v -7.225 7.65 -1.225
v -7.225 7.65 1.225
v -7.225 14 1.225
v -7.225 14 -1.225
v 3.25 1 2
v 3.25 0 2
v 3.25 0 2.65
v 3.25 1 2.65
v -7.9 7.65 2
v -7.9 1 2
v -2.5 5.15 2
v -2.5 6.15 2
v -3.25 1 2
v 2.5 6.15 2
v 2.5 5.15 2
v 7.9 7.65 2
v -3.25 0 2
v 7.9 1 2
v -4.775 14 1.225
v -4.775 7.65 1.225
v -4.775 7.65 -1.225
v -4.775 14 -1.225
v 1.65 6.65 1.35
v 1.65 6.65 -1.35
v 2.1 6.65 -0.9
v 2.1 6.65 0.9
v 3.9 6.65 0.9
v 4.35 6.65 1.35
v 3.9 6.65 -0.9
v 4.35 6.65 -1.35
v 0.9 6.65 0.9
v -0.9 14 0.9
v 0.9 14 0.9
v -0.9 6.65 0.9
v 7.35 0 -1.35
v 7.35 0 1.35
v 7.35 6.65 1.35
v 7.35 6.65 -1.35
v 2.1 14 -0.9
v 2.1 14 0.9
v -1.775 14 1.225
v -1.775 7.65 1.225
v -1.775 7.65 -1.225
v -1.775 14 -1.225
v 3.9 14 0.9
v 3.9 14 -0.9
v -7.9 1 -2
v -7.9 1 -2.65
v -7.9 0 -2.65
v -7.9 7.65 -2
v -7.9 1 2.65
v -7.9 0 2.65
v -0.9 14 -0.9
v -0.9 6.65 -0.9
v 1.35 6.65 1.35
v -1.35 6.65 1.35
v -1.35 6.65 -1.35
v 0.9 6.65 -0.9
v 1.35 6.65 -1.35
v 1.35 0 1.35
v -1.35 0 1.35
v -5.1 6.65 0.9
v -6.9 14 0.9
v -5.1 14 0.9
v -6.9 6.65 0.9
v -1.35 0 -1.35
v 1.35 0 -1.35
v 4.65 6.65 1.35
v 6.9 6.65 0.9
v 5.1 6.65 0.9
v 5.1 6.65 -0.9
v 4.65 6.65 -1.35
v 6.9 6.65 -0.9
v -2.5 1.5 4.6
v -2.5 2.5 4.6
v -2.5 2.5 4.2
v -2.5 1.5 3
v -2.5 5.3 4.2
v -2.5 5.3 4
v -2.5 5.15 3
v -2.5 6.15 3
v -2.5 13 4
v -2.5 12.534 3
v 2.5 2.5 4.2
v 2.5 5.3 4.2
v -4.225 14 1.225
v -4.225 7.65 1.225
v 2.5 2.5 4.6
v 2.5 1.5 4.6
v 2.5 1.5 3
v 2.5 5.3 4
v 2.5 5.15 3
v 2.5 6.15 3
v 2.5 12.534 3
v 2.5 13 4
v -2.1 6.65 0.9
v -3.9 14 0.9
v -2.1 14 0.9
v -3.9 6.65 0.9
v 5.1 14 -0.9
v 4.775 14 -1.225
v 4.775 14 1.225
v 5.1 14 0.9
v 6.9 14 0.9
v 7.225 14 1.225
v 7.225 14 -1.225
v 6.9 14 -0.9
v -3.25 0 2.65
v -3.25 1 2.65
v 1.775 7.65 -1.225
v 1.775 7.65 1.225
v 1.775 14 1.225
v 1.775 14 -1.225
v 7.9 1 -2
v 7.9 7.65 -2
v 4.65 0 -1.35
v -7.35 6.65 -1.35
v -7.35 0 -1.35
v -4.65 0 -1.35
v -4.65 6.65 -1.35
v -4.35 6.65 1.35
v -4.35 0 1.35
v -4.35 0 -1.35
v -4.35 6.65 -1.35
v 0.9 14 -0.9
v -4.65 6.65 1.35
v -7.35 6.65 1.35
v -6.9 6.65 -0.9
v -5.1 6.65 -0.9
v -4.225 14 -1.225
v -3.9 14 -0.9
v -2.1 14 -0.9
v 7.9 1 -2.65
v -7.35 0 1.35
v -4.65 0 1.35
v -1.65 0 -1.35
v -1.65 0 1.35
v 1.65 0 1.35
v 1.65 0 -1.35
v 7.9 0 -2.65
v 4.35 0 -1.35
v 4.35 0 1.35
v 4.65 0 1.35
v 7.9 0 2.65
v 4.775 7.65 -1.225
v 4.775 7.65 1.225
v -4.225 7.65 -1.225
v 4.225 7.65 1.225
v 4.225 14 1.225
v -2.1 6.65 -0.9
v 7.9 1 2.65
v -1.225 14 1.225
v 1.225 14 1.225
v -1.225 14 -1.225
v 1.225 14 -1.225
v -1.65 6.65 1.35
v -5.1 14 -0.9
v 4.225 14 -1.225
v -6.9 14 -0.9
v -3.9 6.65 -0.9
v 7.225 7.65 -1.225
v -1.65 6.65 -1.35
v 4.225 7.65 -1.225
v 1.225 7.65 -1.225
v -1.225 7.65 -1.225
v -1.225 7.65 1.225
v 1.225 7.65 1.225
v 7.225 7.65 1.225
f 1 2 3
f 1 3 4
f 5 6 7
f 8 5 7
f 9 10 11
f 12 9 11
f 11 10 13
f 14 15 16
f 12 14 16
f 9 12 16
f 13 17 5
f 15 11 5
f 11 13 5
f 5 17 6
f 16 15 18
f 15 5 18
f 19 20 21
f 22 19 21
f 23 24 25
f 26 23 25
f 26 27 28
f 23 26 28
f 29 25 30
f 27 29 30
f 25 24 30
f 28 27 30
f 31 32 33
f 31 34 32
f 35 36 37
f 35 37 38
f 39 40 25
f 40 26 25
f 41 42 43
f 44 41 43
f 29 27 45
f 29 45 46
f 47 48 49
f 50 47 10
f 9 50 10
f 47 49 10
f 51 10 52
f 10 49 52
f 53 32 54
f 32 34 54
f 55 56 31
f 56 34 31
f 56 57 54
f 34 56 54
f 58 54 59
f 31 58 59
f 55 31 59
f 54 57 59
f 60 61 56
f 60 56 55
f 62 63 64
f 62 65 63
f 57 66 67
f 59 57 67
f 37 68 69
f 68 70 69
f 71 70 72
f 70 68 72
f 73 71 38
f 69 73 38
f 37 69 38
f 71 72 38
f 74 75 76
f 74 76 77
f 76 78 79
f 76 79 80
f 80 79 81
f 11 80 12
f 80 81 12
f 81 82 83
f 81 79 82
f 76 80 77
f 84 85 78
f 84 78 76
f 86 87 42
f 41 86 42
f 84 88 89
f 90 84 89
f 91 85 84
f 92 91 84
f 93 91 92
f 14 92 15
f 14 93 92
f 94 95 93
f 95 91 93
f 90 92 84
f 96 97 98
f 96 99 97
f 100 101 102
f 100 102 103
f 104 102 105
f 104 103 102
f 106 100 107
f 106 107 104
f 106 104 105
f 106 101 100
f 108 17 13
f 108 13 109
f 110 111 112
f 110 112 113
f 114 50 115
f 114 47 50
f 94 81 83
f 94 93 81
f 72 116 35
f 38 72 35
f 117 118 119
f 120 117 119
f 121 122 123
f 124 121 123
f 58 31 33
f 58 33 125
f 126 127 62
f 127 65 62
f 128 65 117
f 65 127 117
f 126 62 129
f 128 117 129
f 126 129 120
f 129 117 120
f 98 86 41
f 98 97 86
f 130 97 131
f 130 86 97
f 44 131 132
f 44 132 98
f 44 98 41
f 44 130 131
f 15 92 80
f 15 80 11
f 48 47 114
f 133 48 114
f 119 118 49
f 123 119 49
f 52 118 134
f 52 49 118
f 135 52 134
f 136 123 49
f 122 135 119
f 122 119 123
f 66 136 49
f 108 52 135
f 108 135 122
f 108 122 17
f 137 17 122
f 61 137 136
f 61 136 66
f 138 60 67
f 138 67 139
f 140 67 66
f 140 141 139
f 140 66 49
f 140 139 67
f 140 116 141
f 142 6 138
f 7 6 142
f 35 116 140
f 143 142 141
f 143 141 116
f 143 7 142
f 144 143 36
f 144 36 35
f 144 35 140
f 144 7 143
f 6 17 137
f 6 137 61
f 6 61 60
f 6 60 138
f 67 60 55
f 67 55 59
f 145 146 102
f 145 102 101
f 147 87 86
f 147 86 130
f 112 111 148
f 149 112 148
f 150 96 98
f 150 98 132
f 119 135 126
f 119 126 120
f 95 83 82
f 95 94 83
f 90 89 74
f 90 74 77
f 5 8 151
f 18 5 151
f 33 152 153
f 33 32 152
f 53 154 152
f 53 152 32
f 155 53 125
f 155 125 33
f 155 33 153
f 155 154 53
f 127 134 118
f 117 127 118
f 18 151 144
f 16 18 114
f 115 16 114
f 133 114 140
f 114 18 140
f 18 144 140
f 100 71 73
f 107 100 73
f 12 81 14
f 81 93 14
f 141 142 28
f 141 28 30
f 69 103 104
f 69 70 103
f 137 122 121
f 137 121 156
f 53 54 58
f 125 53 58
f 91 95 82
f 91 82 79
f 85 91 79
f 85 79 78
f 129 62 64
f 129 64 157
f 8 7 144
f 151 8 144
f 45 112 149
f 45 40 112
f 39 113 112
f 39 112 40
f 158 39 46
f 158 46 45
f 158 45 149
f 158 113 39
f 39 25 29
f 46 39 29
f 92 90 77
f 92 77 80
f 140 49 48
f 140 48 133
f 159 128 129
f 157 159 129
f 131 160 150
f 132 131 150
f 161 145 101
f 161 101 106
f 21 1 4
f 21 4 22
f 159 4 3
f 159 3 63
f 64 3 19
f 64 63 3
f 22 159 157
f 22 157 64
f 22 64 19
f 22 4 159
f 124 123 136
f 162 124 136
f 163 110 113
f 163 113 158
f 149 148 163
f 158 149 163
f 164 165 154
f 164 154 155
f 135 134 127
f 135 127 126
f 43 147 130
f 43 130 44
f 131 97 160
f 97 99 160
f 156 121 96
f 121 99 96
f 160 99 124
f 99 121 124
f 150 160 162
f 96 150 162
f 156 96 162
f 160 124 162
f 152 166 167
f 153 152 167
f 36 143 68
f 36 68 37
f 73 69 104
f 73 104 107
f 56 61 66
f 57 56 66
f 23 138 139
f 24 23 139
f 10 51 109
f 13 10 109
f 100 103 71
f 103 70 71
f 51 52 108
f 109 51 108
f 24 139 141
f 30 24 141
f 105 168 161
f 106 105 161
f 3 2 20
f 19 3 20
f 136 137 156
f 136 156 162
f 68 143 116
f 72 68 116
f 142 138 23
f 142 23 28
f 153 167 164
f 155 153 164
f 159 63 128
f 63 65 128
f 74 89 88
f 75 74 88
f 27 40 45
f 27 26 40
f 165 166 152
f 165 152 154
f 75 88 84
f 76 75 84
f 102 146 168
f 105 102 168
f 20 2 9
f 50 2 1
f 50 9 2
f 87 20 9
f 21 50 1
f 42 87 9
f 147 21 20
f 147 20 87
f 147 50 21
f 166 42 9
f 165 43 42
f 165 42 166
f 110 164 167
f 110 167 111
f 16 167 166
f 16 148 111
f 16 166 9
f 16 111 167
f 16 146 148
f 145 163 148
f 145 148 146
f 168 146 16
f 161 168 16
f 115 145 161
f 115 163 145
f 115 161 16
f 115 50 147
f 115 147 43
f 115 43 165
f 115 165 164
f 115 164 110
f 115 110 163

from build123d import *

# Parameters (mm, degrees)
SKETCH1_W           = 15.8
SKETCH1_H           = 4
SKETCH1_W_2         = 2.7
SKETCH1_H_2         = 2.7
BOSS_EXTRUDE1_DEPTH = 7.65
SKETCH2_W           = 15.8
SKETCH2_H           = 4
SKETCH2_W_2         = 1.8
SKETCH2_H_2         = 1.8
BOSS_EXTRUDE2_DEPTH = 1
SKETCH3_W           = 2.45
SKETCH3_H           = 2.45
SKETCH3_W_2         = 1.8
SKETCH3_H_2         = 1.8
BOSS_EXTRUDE3_DEPTH = 6.35
SKETCH4_W           = 4.65
SKETCH4_H           = 0.65
SKETCH4_W_2         = 15.8
BOSS_EXTRUDE4_DEPTH = 1
SKETCH5_W           = 1
SKETCH5_H           = 1
SKETCH5_W_2         = 0.4
BOSS_EXTRUDE5_DEPTH = 2.5


with BuildPart() as part:
    # Sketch1 → Boss-Extrude1 (new body)
    with BuildSketch(Plane(origin=(0, 0, 0), x_dir=(1, 0, 0), z_dir=(0, 1, 0))):
        Rectangle(SKETCH1_W, SKETCH1_H)
        Rectangle(SKETCH1_W_2, SKETCH1_H_2, mode=Mode.SUBTRACT)
        with Locations((3, 0)):
            Rectangle(SKETCH1_W_2, SKETCH1_H_2, mode=Mode.SUBTRACT)
        with Locations((6, 0)):
            Rectangle(SKETCH1_W_2, SKETCH1_H_2, mode=Mode.SUBTRACT)
        with Locations((-6, 0)):
            Rectangle(SKETCH1_W_2, SKETCH1_H_2, mode=Mode.SUBTRACT)
        with Locations((-3, 0)):
            Rectangle(SKETCH1_W_2, SKETCH1_H_2, mode=Mode.SUBTRACT)
    extrude(amount=BOSS_EXTRUDE1_DEPTH)

    # Sketch2 → Boss-Extrude2 (add)
    with BuildSketch(Plane(origin=(0, 7.65, 0), x_dir=(1, 0, 0), z_dir=(0, 1, 0))):
        Rectangle(SKETCH2_W, SKETCH2_H)
        with Locations((-6, 0)):
            Rectangle(SKETCH2_W_2, SKETCH2_H_2, mode=Mode.SUBTRACT)
        with Locations((-3, 0)):
            Rectangle(SKETCH2_W_2, SKETCH2_H_2, mode=Mode.SUBTRACT)
        Rectangle(SKETCH2_W_2, SKETCH2_H_2, mode=Mode.SUBTRACT)
        with Locations((3, 0)):
            Rectangle(SKETCH2_W_2, SKETCH2_H_2, mode=Mode.SUBTRACT)
        with Locations((6, 0)):
            Rectangle(SKETCH2_W_2, SKETCH2_H_2, mode=Mode.SUBTRACT)
    extrude(amount=-BOSS_EXTRUDE2_DEPTH)

    # Sketch3 → Boss-Extrude3 (add)
    with BuildSketch(Plane(origin=(0, 7.65, 0), x_dir=(1, 0, 0), z_dir=(0, 1, 0))):
        with Locations((-6, 0)):
            Rectangle(SKETCH3_W, SKETCH3_H)
        with Locations((-6, 0)):
            Rectangle(SKETCH3_W_2, SKETCH3_H_2, mode=Mode.SUBTRACT)
        with Locations((-3, 0)):
            Rectangle(SKETCH3_W, SKETCH3_H)
        with Locations((-3, 0)):
            Rectangle(SKETCH3_W_2, SKETCH3_H_2, mode=Mode.SUBTRACT)
        Rectangle(SKETCH3_W, SKETCH3_H)
        Rectangle(SKETCH3_W_2, SKETCH3_H_2, mode=Mode.SUBTRACT)
        with Locations((3, 0)):
            Rectangle(SKETCH3_W, SKETCH3_H)
        with Locations((3, 0)):
            Rectangle(SKETCH3_W_2, SKETCH3_H_2, mode=Mode.SUBTRACT)
        with Locations((6, 0)):
            Rectangle(SKETCH3_W, SKETCH3_H)
        with Locations((6, 0)):
            Rectangle(SKETCH3_W_2, SKETCH3_H_2, mode=Mode.SUBTRACT)
    extrude(amount=BOSS_EXTRUDE3_DEPTH)

    # Sketch4 → Boss-Extrude4 (add)
    with BuildSketch(Plane.XZ):
        with Locations((-5.575, 2.325)):
            Rectangle(SKETCH4_W, SKETCH4_H)
        with Locations((5.575, 2.325)):
            Rectangle(SKETCH4_W, SKETCH4_H)
        with Locations((0, -2.325)):
            Rectangle(SKETCH4_W_2, SKETCH4_H)
    extrude(amount=-BOSS_EXTRUDE4_DEPTH)

    # Sketch5 → Boss-Extrude5 (add, symmetric)
    with BuildSketch(Plane(origin=(0, 0, 0), x_dir=(0, 0, -1), z_dir=(1, 0, 0))):
        Polygon((-3, 5.15), (-3, 6.15), (-3, 12.533692342), (-4, 13), (-4, 5.3), (-4, 1.5), (-3, 1.5), align=None)
        with Locations((-2.5, 5.65)):
            Rectangle(SKETCH5_W, SKETCH5_H)
        Polygon((-4.2, 1.5), (-4, 1.5), (-4, 5.3), (-4.2, 5.3), (-4.2, 2.5), align=None)
        with Locations((-4.4, 2)):
            Rectangle(SKETCH5_W_2, SKETCH5_H)
    extrude(amount=BOSS_EXTRUDE5_DEPTH, both=True)


solid = part.part
